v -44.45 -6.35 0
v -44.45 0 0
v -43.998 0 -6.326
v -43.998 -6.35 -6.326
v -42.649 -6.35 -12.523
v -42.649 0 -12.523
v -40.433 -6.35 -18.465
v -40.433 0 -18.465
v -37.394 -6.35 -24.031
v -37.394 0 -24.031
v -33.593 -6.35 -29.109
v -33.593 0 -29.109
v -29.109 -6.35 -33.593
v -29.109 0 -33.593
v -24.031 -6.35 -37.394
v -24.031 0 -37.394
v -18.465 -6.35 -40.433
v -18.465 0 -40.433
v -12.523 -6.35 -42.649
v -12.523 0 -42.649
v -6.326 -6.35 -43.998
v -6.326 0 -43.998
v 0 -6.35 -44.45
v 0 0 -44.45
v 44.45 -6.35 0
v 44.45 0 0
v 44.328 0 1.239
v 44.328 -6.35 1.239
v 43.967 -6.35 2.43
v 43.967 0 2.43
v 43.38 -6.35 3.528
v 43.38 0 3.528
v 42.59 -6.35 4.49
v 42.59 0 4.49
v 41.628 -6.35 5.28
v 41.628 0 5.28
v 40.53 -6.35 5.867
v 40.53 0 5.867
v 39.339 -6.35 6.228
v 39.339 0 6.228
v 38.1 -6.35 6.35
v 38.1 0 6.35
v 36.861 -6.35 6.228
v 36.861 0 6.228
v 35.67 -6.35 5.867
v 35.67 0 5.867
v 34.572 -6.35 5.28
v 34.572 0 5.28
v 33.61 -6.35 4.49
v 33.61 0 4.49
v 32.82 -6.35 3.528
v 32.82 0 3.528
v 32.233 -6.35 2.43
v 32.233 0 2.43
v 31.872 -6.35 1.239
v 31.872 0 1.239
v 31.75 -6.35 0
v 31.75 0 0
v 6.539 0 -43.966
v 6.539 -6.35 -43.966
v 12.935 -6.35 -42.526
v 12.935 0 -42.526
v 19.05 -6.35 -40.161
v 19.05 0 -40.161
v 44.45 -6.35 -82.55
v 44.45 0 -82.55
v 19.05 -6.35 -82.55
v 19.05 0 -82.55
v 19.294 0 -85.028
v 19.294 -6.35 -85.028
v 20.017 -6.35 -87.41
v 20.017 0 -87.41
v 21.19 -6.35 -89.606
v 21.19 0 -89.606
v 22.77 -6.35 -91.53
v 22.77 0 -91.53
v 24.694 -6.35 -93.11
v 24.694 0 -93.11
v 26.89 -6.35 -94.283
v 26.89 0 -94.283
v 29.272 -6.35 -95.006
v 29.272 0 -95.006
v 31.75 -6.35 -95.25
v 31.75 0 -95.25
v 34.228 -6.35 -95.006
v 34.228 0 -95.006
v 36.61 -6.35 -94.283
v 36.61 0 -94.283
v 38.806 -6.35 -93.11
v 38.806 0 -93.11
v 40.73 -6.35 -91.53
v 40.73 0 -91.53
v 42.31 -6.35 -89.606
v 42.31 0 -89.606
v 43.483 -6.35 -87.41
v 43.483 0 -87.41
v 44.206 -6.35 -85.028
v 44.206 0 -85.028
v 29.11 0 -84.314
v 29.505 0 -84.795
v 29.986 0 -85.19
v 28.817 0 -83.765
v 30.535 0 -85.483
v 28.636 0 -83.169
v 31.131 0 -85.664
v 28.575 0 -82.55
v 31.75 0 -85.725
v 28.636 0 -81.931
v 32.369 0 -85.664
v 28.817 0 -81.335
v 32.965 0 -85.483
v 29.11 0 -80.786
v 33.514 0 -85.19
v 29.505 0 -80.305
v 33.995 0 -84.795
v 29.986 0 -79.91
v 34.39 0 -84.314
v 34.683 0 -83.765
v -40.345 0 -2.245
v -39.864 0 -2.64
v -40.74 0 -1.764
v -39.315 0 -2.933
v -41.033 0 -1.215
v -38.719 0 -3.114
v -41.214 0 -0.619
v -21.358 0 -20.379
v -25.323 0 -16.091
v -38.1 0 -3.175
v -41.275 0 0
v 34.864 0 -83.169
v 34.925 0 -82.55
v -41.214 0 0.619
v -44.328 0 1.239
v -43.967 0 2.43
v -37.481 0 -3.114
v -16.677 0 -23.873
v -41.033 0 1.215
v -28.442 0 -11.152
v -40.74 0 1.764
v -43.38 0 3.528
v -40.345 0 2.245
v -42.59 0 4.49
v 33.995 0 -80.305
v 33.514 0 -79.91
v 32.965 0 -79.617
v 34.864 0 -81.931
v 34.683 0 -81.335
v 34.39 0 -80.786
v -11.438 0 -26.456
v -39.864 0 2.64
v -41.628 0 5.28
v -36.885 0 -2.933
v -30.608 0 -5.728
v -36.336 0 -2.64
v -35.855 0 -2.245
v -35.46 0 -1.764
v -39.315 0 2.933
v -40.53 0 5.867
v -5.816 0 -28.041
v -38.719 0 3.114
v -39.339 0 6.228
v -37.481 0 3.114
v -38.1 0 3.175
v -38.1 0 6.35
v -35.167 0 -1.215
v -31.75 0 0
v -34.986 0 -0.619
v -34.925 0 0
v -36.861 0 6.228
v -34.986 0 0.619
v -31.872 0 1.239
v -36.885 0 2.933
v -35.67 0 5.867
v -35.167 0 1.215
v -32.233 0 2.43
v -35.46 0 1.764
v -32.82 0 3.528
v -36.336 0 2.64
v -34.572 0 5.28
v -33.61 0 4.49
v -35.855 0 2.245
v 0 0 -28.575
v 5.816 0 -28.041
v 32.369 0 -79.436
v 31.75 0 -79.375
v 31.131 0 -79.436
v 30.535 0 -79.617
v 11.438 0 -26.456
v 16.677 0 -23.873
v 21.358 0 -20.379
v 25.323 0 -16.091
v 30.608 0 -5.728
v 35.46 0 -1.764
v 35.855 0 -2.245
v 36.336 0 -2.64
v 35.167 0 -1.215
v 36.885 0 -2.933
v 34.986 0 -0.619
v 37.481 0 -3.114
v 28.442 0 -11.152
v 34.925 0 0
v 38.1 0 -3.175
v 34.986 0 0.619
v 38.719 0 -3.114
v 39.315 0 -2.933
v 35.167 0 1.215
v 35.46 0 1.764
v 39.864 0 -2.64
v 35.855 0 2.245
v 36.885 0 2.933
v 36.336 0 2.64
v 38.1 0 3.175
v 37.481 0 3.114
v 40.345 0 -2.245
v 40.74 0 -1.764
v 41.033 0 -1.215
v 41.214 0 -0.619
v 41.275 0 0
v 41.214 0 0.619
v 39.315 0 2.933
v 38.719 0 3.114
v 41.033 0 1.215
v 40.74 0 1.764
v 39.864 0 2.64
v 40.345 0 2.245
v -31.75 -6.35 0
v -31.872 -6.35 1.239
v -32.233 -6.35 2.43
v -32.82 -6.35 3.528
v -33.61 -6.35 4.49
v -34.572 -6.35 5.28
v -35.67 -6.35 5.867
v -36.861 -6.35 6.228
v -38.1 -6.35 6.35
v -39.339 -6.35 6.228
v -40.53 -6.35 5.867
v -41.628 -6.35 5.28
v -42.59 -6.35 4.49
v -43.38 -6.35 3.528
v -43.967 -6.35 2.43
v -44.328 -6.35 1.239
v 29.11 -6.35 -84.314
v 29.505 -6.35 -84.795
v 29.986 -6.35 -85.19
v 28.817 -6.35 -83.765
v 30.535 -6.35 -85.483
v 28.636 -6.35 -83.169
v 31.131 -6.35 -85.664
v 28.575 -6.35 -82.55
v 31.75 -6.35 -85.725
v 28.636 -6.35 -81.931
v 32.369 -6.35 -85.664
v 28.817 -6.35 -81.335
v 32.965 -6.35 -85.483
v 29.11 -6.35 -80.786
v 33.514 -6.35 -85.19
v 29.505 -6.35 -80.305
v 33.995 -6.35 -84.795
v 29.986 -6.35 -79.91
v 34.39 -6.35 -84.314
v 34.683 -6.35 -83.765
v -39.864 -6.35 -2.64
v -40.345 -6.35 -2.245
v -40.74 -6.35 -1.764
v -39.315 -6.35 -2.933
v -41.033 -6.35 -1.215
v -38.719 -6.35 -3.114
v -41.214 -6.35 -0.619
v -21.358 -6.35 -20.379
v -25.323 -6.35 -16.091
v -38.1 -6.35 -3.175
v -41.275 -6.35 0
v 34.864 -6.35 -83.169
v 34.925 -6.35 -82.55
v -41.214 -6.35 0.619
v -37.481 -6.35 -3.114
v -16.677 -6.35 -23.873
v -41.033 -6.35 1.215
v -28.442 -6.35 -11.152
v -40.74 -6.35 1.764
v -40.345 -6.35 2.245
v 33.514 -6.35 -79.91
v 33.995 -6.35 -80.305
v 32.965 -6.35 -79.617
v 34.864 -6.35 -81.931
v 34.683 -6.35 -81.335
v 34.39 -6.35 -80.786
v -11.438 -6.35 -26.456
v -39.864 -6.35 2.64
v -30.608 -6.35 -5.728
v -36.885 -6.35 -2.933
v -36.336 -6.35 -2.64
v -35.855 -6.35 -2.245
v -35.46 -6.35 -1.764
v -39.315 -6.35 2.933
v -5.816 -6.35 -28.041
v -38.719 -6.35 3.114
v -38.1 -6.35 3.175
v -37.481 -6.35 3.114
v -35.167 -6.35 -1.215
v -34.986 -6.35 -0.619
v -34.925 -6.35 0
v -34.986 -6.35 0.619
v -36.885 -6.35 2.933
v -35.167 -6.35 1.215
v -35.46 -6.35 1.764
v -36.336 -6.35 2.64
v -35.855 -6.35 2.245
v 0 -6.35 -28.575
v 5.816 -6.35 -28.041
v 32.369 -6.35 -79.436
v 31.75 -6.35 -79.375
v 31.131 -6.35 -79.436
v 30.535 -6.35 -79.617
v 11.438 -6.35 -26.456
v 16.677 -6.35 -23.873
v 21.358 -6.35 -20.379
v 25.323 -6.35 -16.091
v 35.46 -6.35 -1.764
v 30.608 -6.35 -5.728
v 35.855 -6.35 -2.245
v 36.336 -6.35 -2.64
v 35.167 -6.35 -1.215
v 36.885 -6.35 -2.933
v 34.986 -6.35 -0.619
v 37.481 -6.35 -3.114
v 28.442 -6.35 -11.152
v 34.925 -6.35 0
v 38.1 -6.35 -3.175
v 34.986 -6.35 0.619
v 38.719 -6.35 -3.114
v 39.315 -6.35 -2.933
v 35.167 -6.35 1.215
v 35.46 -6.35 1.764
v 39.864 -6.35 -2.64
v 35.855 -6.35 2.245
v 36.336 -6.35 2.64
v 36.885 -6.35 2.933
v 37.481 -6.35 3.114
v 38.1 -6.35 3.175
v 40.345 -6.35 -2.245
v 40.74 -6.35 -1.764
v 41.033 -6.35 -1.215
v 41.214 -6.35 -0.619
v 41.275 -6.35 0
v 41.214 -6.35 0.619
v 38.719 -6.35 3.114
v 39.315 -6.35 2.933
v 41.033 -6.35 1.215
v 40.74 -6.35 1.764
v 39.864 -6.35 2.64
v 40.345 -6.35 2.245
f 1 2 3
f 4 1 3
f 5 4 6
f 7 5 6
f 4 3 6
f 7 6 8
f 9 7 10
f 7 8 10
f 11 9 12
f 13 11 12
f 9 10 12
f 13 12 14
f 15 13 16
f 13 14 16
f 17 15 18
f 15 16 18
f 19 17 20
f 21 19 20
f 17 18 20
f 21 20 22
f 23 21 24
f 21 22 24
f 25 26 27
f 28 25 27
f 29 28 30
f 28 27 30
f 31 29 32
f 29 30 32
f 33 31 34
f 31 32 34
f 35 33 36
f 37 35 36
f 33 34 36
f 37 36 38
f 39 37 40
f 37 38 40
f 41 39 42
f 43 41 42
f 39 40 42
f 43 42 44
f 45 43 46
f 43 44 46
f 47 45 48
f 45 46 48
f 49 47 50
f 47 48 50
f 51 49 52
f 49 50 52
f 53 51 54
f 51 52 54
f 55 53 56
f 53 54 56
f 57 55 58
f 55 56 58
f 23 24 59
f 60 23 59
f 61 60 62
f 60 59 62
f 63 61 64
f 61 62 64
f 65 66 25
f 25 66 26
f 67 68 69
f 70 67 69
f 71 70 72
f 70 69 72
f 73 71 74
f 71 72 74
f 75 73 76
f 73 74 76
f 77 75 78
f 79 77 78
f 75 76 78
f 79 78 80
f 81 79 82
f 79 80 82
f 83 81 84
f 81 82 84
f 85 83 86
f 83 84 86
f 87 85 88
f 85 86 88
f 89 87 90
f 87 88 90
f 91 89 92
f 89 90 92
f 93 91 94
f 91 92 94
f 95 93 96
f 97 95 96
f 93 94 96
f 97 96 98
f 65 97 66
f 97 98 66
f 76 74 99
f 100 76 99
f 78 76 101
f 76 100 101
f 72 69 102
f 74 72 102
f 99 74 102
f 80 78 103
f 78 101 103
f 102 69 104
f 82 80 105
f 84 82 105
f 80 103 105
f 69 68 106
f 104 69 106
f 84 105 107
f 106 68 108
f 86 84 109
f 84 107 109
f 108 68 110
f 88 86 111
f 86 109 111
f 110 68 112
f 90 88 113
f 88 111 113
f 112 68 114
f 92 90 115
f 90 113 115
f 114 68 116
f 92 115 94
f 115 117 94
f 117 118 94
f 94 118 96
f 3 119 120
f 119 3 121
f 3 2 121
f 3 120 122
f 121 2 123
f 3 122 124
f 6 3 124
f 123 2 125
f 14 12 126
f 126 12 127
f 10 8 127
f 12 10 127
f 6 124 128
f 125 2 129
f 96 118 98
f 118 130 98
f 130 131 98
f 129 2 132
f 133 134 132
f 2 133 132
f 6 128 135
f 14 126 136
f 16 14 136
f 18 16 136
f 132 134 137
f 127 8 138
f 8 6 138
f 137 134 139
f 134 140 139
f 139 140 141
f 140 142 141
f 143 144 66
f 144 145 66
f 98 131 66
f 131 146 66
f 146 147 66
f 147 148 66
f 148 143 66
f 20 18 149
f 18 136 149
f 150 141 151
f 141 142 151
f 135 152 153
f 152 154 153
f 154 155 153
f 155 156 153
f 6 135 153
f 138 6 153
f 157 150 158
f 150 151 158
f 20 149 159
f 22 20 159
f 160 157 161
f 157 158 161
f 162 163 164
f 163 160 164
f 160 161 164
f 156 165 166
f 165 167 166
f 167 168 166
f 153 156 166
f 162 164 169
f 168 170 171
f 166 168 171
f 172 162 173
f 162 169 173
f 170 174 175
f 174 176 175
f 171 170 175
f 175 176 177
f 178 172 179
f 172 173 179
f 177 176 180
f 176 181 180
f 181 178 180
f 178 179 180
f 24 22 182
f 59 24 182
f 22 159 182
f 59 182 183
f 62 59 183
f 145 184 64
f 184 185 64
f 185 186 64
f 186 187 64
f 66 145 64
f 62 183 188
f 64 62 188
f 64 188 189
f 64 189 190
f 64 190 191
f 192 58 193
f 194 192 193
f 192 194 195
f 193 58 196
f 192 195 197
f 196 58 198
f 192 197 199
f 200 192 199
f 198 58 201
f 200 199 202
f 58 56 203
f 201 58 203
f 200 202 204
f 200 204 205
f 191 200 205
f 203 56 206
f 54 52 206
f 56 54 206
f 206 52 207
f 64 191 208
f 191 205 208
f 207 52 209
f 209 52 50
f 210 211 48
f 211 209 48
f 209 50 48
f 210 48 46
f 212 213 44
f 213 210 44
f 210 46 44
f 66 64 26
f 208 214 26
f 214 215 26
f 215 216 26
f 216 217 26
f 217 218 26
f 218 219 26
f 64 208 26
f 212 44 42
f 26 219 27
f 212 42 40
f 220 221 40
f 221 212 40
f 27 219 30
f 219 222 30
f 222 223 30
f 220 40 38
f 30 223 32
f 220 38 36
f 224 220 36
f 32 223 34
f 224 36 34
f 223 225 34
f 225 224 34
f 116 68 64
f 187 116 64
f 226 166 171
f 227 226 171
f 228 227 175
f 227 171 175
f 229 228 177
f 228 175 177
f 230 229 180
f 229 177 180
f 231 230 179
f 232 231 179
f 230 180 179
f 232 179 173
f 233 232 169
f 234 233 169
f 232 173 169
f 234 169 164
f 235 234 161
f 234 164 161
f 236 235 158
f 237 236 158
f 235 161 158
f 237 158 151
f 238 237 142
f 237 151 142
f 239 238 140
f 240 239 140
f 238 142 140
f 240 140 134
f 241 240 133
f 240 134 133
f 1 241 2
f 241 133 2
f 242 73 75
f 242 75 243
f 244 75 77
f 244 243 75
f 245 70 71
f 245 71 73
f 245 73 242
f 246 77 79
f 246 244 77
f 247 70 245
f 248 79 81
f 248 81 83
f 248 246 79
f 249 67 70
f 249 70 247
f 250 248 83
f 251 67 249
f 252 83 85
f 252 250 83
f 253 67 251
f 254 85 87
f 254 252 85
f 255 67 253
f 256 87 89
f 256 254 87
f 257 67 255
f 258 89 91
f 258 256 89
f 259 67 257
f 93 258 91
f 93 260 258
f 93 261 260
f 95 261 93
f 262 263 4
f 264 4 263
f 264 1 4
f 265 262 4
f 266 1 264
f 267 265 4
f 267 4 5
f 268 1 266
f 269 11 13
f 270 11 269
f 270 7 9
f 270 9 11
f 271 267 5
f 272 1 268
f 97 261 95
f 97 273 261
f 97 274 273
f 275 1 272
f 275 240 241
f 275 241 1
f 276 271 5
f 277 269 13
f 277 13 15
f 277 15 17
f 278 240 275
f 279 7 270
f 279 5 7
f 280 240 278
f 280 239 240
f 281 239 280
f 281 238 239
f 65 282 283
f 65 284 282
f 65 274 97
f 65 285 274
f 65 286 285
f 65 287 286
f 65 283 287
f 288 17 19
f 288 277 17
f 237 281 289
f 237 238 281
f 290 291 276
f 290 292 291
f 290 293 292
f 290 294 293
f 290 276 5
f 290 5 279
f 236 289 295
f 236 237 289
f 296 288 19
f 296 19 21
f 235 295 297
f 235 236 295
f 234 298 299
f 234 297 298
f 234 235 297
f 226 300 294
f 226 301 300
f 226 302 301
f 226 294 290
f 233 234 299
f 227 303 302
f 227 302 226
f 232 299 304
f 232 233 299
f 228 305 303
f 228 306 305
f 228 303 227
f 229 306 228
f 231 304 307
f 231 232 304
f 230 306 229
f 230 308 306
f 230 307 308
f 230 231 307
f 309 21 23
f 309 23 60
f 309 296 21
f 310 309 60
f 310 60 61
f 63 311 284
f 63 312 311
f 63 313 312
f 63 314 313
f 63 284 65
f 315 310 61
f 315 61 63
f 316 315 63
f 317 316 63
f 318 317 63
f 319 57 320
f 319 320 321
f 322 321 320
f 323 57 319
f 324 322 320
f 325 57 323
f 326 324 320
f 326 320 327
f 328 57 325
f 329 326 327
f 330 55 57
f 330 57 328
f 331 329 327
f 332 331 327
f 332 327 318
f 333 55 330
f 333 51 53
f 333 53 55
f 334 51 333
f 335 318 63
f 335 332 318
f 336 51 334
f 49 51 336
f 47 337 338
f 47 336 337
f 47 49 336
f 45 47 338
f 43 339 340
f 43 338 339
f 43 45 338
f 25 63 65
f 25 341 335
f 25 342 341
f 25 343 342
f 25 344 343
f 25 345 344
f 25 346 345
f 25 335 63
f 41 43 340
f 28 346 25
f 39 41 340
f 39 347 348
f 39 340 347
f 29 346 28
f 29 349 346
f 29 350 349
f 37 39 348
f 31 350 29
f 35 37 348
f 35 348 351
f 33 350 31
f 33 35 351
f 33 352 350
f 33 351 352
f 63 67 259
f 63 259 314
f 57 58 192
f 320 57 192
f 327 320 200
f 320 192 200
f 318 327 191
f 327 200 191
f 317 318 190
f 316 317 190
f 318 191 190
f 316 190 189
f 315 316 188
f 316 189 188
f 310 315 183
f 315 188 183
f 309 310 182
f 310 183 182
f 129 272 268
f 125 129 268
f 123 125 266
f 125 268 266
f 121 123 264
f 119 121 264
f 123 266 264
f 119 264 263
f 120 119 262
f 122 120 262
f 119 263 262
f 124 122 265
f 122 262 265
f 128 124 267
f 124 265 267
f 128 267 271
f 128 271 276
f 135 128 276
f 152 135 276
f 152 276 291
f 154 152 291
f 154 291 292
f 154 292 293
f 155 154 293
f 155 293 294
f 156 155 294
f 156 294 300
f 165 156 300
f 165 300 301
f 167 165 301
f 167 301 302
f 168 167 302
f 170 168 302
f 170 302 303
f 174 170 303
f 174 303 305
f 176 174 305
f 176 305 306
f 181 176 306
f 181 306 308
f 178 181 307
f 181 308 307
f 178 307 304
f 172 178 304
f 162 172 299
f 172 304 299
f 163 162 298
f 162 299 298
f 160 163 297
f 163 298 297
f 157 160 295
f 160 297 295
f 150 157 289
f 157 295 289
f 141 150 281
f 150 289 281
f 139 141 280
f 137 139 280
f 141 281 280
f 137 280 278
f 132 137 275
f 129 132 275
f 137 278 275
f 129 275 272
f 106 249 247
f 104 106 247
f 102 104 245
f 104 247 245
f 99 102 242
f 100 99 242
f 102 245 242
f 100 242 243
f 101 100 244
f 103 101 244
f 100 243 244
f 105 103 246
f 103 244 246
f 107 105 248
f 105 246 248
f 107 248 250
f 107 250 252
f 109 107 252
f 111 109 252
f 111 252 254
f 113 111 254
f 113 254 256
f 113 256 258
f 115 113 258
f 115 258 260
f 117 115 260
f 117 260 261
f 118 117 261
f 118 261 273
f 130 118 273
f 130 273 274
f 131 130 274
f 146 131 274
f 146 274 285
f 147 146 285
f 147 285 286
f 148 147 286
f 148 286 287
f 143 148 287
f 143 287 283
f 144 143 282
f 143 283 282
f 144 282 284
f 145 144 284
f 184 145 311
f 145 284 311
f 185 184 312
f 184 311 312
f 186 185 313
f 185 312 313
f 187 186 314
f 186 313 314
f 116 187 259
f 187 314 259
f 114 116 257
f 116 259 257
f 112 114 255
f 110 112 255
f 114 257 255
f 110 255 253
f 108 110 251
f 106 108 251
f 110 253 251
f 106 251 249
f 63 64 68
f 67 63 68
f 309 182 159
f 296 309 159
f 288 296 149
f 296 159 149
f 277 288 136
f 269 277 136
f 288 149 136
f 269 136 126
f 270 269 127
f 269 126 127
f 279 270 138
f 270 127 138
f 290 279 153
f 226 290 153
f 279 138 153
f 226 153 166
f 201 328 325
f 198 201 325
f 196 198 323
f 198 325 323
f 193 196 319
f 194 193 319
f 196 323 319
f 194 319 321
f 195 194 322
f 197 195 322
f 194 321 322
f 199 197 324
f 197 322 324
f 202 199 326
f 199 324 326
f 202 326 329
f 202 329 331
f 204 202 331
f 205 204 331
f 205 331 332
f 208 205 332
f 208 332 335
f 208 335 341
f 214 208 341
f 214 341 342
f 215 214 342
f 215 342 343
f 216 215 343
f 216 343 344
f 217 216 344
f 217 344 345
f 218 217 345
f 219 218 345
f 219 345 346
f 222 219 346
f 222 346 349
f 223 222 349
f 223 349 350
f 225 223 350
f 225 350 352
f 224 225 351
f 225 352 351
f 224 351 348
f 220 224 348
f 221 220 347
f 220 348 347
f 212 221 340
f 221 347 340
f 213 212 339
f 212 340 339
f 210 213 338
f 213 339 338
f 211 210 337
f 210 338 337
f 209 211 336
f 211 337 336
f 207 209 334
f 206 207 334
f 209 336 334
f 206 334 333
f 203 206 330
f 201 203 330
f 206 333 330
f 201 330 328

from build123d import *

# Parameters (mm, degrees)
F1_DEPTH = 6.35
F2_D     = 6.35


# Not quite as in the source:
# - a feature names something its author has since deleted; it is built from what else it names


with BuildPart() as f1:
    # F0 (on Front) → F1 (new body)
    with BuildSketch(Plane.XZ):
        with BuildLine():
            ThreePointArc((44.45, 0), (38.1, 6.35), (31.75, 0))
            ThreePointArc((31.75, 0), (38.1, -6.35), (44.45, 0))
        make_face()
        with BuildLine():
            Line((31.75, -31.1085197333), (31.75, 0))
            ThreePointArc((31.75, 0), (21.3576281747, -20.379309083), (0, -28.575))
            ThreePointArc((0, -28.575), (-21.3576281747, -20.379309083), (-31.75, 0))
            ThreePointArc((-31.75, 0), (-38.1, -6.35), (-44.45, 0))
            ThreePointArc((-44.45, 0), (-31.4308964237, -31.4308964237), (0, -44.45))
            ThreePointArc((0, -44.45), (9.7634350172, -43.3644766677), (19.05, -40.1609262841))
            ThreePointArc((19.05, -40.1609262841), (25.8001262805, -36.1960769132), (31.75, -31.1085197333))
        make_face()
        with BuildLine():
            ThreePointArc((44.45, 0), (38.1, -6.35), (31.75, 0))
            Line((31.75, 0), (31.75, -31.1085197333))
            ThreePointArc((31.75, -31.1085197333), (41.1527034349, -16.8005208253), (44.45, 0))
        make_face()
        with BuildLine():
            ThreePointArc((-44.45, 0), (-38.1, -6.35), (-31.75, 0))
            ThreePointArc((-31.75, 0), (-38.1, 6.35), (-44.45, 0))
        make_face()
        with BuildLine():
            Line((44.45, -44.45), (44.45, 0))
            ThreePointArc((44.45, 0), (41.1527034349, -16.8005208253), (31.75, -31.1085197333))
            Line((31.75, -31.1085197333), (31.75, -44.45))
            Line((31.75, -44.45), (44.45, -44.45))
        make_face()
        with BuildLine():
            Line((31.75, -44.45), (31.75, -31.1085197333))
            ThreePointArc((31.75, -31.1085197333), (25.8001262805, -36.1960769132), (19.05, -40.1609262841))
            Line((19.05, -40.1609262841), (19.05, -44.45))
            Line((19.05, -44.45), (31.75, -44.45))
        make_face()
        with BuildLine():
            Line((44.45, -82.55), (44.45, -44.45))
            Line((44.45, -44.45), (31.75, -44.45))
            Line((31.75, -44.45), (31.75, -69.85))
            ThreePointArc((31.75, -69.85), (40.7302561211, -73.5697438789), (44.45, -82.55))
        make_face()
        with BuildLine():
            Line((31.75, -69.85), (31.75, -44.45))
            Line((31.75, -44.45), (19.05, -44.45))
            Line((19.05, -44.45), (19.05, -82.55))
            ThreePointArc((19.05, -82.55), (22.7697438789, -73.5697438789), (31.75, -69.85))
        make_face()
        with BuildLine():
            Line((31.75, -82.55), (44.45, -82.55))
            ThreePointArc((44.45, -82.55), (40.7302561211, -73.5697438789), (31.75, -69.85))
            Line((31.75, -69.85), (31.75, -82.55))
        make_face()
        with BuildLine():
            ThreePointArc((19.05, -82.55), (31.75, -95.25), (44.45, -82.55))
            Line((44.45, -82.55), (31.75, -82.55))
            Line((31.75, -82.55), (19.05, -82.55))
        make_face()
        with BuildLine():
            Line((31.75, -82.55), (31.75, -69.85))
            ThreePointArc((31.75, -69.85), (22.7697438789, -73.5697438789), (19.05, -82.55))
            Line((19.05, -82.55), (31.75, -82.55))
        make_face()
    extrude(amount=F1_DEPTH)

    # F2 (through all)
    with Locations(Plane(origin=(0, 0, 0), x_dir=(1, 0, 0), z_dir=(0, 1, 0))):
        with Locations((-38.1, 0), (38.1, 0), (31.75, 82.55)):
            Hole(F2_D / 2)


solid = f1.part
